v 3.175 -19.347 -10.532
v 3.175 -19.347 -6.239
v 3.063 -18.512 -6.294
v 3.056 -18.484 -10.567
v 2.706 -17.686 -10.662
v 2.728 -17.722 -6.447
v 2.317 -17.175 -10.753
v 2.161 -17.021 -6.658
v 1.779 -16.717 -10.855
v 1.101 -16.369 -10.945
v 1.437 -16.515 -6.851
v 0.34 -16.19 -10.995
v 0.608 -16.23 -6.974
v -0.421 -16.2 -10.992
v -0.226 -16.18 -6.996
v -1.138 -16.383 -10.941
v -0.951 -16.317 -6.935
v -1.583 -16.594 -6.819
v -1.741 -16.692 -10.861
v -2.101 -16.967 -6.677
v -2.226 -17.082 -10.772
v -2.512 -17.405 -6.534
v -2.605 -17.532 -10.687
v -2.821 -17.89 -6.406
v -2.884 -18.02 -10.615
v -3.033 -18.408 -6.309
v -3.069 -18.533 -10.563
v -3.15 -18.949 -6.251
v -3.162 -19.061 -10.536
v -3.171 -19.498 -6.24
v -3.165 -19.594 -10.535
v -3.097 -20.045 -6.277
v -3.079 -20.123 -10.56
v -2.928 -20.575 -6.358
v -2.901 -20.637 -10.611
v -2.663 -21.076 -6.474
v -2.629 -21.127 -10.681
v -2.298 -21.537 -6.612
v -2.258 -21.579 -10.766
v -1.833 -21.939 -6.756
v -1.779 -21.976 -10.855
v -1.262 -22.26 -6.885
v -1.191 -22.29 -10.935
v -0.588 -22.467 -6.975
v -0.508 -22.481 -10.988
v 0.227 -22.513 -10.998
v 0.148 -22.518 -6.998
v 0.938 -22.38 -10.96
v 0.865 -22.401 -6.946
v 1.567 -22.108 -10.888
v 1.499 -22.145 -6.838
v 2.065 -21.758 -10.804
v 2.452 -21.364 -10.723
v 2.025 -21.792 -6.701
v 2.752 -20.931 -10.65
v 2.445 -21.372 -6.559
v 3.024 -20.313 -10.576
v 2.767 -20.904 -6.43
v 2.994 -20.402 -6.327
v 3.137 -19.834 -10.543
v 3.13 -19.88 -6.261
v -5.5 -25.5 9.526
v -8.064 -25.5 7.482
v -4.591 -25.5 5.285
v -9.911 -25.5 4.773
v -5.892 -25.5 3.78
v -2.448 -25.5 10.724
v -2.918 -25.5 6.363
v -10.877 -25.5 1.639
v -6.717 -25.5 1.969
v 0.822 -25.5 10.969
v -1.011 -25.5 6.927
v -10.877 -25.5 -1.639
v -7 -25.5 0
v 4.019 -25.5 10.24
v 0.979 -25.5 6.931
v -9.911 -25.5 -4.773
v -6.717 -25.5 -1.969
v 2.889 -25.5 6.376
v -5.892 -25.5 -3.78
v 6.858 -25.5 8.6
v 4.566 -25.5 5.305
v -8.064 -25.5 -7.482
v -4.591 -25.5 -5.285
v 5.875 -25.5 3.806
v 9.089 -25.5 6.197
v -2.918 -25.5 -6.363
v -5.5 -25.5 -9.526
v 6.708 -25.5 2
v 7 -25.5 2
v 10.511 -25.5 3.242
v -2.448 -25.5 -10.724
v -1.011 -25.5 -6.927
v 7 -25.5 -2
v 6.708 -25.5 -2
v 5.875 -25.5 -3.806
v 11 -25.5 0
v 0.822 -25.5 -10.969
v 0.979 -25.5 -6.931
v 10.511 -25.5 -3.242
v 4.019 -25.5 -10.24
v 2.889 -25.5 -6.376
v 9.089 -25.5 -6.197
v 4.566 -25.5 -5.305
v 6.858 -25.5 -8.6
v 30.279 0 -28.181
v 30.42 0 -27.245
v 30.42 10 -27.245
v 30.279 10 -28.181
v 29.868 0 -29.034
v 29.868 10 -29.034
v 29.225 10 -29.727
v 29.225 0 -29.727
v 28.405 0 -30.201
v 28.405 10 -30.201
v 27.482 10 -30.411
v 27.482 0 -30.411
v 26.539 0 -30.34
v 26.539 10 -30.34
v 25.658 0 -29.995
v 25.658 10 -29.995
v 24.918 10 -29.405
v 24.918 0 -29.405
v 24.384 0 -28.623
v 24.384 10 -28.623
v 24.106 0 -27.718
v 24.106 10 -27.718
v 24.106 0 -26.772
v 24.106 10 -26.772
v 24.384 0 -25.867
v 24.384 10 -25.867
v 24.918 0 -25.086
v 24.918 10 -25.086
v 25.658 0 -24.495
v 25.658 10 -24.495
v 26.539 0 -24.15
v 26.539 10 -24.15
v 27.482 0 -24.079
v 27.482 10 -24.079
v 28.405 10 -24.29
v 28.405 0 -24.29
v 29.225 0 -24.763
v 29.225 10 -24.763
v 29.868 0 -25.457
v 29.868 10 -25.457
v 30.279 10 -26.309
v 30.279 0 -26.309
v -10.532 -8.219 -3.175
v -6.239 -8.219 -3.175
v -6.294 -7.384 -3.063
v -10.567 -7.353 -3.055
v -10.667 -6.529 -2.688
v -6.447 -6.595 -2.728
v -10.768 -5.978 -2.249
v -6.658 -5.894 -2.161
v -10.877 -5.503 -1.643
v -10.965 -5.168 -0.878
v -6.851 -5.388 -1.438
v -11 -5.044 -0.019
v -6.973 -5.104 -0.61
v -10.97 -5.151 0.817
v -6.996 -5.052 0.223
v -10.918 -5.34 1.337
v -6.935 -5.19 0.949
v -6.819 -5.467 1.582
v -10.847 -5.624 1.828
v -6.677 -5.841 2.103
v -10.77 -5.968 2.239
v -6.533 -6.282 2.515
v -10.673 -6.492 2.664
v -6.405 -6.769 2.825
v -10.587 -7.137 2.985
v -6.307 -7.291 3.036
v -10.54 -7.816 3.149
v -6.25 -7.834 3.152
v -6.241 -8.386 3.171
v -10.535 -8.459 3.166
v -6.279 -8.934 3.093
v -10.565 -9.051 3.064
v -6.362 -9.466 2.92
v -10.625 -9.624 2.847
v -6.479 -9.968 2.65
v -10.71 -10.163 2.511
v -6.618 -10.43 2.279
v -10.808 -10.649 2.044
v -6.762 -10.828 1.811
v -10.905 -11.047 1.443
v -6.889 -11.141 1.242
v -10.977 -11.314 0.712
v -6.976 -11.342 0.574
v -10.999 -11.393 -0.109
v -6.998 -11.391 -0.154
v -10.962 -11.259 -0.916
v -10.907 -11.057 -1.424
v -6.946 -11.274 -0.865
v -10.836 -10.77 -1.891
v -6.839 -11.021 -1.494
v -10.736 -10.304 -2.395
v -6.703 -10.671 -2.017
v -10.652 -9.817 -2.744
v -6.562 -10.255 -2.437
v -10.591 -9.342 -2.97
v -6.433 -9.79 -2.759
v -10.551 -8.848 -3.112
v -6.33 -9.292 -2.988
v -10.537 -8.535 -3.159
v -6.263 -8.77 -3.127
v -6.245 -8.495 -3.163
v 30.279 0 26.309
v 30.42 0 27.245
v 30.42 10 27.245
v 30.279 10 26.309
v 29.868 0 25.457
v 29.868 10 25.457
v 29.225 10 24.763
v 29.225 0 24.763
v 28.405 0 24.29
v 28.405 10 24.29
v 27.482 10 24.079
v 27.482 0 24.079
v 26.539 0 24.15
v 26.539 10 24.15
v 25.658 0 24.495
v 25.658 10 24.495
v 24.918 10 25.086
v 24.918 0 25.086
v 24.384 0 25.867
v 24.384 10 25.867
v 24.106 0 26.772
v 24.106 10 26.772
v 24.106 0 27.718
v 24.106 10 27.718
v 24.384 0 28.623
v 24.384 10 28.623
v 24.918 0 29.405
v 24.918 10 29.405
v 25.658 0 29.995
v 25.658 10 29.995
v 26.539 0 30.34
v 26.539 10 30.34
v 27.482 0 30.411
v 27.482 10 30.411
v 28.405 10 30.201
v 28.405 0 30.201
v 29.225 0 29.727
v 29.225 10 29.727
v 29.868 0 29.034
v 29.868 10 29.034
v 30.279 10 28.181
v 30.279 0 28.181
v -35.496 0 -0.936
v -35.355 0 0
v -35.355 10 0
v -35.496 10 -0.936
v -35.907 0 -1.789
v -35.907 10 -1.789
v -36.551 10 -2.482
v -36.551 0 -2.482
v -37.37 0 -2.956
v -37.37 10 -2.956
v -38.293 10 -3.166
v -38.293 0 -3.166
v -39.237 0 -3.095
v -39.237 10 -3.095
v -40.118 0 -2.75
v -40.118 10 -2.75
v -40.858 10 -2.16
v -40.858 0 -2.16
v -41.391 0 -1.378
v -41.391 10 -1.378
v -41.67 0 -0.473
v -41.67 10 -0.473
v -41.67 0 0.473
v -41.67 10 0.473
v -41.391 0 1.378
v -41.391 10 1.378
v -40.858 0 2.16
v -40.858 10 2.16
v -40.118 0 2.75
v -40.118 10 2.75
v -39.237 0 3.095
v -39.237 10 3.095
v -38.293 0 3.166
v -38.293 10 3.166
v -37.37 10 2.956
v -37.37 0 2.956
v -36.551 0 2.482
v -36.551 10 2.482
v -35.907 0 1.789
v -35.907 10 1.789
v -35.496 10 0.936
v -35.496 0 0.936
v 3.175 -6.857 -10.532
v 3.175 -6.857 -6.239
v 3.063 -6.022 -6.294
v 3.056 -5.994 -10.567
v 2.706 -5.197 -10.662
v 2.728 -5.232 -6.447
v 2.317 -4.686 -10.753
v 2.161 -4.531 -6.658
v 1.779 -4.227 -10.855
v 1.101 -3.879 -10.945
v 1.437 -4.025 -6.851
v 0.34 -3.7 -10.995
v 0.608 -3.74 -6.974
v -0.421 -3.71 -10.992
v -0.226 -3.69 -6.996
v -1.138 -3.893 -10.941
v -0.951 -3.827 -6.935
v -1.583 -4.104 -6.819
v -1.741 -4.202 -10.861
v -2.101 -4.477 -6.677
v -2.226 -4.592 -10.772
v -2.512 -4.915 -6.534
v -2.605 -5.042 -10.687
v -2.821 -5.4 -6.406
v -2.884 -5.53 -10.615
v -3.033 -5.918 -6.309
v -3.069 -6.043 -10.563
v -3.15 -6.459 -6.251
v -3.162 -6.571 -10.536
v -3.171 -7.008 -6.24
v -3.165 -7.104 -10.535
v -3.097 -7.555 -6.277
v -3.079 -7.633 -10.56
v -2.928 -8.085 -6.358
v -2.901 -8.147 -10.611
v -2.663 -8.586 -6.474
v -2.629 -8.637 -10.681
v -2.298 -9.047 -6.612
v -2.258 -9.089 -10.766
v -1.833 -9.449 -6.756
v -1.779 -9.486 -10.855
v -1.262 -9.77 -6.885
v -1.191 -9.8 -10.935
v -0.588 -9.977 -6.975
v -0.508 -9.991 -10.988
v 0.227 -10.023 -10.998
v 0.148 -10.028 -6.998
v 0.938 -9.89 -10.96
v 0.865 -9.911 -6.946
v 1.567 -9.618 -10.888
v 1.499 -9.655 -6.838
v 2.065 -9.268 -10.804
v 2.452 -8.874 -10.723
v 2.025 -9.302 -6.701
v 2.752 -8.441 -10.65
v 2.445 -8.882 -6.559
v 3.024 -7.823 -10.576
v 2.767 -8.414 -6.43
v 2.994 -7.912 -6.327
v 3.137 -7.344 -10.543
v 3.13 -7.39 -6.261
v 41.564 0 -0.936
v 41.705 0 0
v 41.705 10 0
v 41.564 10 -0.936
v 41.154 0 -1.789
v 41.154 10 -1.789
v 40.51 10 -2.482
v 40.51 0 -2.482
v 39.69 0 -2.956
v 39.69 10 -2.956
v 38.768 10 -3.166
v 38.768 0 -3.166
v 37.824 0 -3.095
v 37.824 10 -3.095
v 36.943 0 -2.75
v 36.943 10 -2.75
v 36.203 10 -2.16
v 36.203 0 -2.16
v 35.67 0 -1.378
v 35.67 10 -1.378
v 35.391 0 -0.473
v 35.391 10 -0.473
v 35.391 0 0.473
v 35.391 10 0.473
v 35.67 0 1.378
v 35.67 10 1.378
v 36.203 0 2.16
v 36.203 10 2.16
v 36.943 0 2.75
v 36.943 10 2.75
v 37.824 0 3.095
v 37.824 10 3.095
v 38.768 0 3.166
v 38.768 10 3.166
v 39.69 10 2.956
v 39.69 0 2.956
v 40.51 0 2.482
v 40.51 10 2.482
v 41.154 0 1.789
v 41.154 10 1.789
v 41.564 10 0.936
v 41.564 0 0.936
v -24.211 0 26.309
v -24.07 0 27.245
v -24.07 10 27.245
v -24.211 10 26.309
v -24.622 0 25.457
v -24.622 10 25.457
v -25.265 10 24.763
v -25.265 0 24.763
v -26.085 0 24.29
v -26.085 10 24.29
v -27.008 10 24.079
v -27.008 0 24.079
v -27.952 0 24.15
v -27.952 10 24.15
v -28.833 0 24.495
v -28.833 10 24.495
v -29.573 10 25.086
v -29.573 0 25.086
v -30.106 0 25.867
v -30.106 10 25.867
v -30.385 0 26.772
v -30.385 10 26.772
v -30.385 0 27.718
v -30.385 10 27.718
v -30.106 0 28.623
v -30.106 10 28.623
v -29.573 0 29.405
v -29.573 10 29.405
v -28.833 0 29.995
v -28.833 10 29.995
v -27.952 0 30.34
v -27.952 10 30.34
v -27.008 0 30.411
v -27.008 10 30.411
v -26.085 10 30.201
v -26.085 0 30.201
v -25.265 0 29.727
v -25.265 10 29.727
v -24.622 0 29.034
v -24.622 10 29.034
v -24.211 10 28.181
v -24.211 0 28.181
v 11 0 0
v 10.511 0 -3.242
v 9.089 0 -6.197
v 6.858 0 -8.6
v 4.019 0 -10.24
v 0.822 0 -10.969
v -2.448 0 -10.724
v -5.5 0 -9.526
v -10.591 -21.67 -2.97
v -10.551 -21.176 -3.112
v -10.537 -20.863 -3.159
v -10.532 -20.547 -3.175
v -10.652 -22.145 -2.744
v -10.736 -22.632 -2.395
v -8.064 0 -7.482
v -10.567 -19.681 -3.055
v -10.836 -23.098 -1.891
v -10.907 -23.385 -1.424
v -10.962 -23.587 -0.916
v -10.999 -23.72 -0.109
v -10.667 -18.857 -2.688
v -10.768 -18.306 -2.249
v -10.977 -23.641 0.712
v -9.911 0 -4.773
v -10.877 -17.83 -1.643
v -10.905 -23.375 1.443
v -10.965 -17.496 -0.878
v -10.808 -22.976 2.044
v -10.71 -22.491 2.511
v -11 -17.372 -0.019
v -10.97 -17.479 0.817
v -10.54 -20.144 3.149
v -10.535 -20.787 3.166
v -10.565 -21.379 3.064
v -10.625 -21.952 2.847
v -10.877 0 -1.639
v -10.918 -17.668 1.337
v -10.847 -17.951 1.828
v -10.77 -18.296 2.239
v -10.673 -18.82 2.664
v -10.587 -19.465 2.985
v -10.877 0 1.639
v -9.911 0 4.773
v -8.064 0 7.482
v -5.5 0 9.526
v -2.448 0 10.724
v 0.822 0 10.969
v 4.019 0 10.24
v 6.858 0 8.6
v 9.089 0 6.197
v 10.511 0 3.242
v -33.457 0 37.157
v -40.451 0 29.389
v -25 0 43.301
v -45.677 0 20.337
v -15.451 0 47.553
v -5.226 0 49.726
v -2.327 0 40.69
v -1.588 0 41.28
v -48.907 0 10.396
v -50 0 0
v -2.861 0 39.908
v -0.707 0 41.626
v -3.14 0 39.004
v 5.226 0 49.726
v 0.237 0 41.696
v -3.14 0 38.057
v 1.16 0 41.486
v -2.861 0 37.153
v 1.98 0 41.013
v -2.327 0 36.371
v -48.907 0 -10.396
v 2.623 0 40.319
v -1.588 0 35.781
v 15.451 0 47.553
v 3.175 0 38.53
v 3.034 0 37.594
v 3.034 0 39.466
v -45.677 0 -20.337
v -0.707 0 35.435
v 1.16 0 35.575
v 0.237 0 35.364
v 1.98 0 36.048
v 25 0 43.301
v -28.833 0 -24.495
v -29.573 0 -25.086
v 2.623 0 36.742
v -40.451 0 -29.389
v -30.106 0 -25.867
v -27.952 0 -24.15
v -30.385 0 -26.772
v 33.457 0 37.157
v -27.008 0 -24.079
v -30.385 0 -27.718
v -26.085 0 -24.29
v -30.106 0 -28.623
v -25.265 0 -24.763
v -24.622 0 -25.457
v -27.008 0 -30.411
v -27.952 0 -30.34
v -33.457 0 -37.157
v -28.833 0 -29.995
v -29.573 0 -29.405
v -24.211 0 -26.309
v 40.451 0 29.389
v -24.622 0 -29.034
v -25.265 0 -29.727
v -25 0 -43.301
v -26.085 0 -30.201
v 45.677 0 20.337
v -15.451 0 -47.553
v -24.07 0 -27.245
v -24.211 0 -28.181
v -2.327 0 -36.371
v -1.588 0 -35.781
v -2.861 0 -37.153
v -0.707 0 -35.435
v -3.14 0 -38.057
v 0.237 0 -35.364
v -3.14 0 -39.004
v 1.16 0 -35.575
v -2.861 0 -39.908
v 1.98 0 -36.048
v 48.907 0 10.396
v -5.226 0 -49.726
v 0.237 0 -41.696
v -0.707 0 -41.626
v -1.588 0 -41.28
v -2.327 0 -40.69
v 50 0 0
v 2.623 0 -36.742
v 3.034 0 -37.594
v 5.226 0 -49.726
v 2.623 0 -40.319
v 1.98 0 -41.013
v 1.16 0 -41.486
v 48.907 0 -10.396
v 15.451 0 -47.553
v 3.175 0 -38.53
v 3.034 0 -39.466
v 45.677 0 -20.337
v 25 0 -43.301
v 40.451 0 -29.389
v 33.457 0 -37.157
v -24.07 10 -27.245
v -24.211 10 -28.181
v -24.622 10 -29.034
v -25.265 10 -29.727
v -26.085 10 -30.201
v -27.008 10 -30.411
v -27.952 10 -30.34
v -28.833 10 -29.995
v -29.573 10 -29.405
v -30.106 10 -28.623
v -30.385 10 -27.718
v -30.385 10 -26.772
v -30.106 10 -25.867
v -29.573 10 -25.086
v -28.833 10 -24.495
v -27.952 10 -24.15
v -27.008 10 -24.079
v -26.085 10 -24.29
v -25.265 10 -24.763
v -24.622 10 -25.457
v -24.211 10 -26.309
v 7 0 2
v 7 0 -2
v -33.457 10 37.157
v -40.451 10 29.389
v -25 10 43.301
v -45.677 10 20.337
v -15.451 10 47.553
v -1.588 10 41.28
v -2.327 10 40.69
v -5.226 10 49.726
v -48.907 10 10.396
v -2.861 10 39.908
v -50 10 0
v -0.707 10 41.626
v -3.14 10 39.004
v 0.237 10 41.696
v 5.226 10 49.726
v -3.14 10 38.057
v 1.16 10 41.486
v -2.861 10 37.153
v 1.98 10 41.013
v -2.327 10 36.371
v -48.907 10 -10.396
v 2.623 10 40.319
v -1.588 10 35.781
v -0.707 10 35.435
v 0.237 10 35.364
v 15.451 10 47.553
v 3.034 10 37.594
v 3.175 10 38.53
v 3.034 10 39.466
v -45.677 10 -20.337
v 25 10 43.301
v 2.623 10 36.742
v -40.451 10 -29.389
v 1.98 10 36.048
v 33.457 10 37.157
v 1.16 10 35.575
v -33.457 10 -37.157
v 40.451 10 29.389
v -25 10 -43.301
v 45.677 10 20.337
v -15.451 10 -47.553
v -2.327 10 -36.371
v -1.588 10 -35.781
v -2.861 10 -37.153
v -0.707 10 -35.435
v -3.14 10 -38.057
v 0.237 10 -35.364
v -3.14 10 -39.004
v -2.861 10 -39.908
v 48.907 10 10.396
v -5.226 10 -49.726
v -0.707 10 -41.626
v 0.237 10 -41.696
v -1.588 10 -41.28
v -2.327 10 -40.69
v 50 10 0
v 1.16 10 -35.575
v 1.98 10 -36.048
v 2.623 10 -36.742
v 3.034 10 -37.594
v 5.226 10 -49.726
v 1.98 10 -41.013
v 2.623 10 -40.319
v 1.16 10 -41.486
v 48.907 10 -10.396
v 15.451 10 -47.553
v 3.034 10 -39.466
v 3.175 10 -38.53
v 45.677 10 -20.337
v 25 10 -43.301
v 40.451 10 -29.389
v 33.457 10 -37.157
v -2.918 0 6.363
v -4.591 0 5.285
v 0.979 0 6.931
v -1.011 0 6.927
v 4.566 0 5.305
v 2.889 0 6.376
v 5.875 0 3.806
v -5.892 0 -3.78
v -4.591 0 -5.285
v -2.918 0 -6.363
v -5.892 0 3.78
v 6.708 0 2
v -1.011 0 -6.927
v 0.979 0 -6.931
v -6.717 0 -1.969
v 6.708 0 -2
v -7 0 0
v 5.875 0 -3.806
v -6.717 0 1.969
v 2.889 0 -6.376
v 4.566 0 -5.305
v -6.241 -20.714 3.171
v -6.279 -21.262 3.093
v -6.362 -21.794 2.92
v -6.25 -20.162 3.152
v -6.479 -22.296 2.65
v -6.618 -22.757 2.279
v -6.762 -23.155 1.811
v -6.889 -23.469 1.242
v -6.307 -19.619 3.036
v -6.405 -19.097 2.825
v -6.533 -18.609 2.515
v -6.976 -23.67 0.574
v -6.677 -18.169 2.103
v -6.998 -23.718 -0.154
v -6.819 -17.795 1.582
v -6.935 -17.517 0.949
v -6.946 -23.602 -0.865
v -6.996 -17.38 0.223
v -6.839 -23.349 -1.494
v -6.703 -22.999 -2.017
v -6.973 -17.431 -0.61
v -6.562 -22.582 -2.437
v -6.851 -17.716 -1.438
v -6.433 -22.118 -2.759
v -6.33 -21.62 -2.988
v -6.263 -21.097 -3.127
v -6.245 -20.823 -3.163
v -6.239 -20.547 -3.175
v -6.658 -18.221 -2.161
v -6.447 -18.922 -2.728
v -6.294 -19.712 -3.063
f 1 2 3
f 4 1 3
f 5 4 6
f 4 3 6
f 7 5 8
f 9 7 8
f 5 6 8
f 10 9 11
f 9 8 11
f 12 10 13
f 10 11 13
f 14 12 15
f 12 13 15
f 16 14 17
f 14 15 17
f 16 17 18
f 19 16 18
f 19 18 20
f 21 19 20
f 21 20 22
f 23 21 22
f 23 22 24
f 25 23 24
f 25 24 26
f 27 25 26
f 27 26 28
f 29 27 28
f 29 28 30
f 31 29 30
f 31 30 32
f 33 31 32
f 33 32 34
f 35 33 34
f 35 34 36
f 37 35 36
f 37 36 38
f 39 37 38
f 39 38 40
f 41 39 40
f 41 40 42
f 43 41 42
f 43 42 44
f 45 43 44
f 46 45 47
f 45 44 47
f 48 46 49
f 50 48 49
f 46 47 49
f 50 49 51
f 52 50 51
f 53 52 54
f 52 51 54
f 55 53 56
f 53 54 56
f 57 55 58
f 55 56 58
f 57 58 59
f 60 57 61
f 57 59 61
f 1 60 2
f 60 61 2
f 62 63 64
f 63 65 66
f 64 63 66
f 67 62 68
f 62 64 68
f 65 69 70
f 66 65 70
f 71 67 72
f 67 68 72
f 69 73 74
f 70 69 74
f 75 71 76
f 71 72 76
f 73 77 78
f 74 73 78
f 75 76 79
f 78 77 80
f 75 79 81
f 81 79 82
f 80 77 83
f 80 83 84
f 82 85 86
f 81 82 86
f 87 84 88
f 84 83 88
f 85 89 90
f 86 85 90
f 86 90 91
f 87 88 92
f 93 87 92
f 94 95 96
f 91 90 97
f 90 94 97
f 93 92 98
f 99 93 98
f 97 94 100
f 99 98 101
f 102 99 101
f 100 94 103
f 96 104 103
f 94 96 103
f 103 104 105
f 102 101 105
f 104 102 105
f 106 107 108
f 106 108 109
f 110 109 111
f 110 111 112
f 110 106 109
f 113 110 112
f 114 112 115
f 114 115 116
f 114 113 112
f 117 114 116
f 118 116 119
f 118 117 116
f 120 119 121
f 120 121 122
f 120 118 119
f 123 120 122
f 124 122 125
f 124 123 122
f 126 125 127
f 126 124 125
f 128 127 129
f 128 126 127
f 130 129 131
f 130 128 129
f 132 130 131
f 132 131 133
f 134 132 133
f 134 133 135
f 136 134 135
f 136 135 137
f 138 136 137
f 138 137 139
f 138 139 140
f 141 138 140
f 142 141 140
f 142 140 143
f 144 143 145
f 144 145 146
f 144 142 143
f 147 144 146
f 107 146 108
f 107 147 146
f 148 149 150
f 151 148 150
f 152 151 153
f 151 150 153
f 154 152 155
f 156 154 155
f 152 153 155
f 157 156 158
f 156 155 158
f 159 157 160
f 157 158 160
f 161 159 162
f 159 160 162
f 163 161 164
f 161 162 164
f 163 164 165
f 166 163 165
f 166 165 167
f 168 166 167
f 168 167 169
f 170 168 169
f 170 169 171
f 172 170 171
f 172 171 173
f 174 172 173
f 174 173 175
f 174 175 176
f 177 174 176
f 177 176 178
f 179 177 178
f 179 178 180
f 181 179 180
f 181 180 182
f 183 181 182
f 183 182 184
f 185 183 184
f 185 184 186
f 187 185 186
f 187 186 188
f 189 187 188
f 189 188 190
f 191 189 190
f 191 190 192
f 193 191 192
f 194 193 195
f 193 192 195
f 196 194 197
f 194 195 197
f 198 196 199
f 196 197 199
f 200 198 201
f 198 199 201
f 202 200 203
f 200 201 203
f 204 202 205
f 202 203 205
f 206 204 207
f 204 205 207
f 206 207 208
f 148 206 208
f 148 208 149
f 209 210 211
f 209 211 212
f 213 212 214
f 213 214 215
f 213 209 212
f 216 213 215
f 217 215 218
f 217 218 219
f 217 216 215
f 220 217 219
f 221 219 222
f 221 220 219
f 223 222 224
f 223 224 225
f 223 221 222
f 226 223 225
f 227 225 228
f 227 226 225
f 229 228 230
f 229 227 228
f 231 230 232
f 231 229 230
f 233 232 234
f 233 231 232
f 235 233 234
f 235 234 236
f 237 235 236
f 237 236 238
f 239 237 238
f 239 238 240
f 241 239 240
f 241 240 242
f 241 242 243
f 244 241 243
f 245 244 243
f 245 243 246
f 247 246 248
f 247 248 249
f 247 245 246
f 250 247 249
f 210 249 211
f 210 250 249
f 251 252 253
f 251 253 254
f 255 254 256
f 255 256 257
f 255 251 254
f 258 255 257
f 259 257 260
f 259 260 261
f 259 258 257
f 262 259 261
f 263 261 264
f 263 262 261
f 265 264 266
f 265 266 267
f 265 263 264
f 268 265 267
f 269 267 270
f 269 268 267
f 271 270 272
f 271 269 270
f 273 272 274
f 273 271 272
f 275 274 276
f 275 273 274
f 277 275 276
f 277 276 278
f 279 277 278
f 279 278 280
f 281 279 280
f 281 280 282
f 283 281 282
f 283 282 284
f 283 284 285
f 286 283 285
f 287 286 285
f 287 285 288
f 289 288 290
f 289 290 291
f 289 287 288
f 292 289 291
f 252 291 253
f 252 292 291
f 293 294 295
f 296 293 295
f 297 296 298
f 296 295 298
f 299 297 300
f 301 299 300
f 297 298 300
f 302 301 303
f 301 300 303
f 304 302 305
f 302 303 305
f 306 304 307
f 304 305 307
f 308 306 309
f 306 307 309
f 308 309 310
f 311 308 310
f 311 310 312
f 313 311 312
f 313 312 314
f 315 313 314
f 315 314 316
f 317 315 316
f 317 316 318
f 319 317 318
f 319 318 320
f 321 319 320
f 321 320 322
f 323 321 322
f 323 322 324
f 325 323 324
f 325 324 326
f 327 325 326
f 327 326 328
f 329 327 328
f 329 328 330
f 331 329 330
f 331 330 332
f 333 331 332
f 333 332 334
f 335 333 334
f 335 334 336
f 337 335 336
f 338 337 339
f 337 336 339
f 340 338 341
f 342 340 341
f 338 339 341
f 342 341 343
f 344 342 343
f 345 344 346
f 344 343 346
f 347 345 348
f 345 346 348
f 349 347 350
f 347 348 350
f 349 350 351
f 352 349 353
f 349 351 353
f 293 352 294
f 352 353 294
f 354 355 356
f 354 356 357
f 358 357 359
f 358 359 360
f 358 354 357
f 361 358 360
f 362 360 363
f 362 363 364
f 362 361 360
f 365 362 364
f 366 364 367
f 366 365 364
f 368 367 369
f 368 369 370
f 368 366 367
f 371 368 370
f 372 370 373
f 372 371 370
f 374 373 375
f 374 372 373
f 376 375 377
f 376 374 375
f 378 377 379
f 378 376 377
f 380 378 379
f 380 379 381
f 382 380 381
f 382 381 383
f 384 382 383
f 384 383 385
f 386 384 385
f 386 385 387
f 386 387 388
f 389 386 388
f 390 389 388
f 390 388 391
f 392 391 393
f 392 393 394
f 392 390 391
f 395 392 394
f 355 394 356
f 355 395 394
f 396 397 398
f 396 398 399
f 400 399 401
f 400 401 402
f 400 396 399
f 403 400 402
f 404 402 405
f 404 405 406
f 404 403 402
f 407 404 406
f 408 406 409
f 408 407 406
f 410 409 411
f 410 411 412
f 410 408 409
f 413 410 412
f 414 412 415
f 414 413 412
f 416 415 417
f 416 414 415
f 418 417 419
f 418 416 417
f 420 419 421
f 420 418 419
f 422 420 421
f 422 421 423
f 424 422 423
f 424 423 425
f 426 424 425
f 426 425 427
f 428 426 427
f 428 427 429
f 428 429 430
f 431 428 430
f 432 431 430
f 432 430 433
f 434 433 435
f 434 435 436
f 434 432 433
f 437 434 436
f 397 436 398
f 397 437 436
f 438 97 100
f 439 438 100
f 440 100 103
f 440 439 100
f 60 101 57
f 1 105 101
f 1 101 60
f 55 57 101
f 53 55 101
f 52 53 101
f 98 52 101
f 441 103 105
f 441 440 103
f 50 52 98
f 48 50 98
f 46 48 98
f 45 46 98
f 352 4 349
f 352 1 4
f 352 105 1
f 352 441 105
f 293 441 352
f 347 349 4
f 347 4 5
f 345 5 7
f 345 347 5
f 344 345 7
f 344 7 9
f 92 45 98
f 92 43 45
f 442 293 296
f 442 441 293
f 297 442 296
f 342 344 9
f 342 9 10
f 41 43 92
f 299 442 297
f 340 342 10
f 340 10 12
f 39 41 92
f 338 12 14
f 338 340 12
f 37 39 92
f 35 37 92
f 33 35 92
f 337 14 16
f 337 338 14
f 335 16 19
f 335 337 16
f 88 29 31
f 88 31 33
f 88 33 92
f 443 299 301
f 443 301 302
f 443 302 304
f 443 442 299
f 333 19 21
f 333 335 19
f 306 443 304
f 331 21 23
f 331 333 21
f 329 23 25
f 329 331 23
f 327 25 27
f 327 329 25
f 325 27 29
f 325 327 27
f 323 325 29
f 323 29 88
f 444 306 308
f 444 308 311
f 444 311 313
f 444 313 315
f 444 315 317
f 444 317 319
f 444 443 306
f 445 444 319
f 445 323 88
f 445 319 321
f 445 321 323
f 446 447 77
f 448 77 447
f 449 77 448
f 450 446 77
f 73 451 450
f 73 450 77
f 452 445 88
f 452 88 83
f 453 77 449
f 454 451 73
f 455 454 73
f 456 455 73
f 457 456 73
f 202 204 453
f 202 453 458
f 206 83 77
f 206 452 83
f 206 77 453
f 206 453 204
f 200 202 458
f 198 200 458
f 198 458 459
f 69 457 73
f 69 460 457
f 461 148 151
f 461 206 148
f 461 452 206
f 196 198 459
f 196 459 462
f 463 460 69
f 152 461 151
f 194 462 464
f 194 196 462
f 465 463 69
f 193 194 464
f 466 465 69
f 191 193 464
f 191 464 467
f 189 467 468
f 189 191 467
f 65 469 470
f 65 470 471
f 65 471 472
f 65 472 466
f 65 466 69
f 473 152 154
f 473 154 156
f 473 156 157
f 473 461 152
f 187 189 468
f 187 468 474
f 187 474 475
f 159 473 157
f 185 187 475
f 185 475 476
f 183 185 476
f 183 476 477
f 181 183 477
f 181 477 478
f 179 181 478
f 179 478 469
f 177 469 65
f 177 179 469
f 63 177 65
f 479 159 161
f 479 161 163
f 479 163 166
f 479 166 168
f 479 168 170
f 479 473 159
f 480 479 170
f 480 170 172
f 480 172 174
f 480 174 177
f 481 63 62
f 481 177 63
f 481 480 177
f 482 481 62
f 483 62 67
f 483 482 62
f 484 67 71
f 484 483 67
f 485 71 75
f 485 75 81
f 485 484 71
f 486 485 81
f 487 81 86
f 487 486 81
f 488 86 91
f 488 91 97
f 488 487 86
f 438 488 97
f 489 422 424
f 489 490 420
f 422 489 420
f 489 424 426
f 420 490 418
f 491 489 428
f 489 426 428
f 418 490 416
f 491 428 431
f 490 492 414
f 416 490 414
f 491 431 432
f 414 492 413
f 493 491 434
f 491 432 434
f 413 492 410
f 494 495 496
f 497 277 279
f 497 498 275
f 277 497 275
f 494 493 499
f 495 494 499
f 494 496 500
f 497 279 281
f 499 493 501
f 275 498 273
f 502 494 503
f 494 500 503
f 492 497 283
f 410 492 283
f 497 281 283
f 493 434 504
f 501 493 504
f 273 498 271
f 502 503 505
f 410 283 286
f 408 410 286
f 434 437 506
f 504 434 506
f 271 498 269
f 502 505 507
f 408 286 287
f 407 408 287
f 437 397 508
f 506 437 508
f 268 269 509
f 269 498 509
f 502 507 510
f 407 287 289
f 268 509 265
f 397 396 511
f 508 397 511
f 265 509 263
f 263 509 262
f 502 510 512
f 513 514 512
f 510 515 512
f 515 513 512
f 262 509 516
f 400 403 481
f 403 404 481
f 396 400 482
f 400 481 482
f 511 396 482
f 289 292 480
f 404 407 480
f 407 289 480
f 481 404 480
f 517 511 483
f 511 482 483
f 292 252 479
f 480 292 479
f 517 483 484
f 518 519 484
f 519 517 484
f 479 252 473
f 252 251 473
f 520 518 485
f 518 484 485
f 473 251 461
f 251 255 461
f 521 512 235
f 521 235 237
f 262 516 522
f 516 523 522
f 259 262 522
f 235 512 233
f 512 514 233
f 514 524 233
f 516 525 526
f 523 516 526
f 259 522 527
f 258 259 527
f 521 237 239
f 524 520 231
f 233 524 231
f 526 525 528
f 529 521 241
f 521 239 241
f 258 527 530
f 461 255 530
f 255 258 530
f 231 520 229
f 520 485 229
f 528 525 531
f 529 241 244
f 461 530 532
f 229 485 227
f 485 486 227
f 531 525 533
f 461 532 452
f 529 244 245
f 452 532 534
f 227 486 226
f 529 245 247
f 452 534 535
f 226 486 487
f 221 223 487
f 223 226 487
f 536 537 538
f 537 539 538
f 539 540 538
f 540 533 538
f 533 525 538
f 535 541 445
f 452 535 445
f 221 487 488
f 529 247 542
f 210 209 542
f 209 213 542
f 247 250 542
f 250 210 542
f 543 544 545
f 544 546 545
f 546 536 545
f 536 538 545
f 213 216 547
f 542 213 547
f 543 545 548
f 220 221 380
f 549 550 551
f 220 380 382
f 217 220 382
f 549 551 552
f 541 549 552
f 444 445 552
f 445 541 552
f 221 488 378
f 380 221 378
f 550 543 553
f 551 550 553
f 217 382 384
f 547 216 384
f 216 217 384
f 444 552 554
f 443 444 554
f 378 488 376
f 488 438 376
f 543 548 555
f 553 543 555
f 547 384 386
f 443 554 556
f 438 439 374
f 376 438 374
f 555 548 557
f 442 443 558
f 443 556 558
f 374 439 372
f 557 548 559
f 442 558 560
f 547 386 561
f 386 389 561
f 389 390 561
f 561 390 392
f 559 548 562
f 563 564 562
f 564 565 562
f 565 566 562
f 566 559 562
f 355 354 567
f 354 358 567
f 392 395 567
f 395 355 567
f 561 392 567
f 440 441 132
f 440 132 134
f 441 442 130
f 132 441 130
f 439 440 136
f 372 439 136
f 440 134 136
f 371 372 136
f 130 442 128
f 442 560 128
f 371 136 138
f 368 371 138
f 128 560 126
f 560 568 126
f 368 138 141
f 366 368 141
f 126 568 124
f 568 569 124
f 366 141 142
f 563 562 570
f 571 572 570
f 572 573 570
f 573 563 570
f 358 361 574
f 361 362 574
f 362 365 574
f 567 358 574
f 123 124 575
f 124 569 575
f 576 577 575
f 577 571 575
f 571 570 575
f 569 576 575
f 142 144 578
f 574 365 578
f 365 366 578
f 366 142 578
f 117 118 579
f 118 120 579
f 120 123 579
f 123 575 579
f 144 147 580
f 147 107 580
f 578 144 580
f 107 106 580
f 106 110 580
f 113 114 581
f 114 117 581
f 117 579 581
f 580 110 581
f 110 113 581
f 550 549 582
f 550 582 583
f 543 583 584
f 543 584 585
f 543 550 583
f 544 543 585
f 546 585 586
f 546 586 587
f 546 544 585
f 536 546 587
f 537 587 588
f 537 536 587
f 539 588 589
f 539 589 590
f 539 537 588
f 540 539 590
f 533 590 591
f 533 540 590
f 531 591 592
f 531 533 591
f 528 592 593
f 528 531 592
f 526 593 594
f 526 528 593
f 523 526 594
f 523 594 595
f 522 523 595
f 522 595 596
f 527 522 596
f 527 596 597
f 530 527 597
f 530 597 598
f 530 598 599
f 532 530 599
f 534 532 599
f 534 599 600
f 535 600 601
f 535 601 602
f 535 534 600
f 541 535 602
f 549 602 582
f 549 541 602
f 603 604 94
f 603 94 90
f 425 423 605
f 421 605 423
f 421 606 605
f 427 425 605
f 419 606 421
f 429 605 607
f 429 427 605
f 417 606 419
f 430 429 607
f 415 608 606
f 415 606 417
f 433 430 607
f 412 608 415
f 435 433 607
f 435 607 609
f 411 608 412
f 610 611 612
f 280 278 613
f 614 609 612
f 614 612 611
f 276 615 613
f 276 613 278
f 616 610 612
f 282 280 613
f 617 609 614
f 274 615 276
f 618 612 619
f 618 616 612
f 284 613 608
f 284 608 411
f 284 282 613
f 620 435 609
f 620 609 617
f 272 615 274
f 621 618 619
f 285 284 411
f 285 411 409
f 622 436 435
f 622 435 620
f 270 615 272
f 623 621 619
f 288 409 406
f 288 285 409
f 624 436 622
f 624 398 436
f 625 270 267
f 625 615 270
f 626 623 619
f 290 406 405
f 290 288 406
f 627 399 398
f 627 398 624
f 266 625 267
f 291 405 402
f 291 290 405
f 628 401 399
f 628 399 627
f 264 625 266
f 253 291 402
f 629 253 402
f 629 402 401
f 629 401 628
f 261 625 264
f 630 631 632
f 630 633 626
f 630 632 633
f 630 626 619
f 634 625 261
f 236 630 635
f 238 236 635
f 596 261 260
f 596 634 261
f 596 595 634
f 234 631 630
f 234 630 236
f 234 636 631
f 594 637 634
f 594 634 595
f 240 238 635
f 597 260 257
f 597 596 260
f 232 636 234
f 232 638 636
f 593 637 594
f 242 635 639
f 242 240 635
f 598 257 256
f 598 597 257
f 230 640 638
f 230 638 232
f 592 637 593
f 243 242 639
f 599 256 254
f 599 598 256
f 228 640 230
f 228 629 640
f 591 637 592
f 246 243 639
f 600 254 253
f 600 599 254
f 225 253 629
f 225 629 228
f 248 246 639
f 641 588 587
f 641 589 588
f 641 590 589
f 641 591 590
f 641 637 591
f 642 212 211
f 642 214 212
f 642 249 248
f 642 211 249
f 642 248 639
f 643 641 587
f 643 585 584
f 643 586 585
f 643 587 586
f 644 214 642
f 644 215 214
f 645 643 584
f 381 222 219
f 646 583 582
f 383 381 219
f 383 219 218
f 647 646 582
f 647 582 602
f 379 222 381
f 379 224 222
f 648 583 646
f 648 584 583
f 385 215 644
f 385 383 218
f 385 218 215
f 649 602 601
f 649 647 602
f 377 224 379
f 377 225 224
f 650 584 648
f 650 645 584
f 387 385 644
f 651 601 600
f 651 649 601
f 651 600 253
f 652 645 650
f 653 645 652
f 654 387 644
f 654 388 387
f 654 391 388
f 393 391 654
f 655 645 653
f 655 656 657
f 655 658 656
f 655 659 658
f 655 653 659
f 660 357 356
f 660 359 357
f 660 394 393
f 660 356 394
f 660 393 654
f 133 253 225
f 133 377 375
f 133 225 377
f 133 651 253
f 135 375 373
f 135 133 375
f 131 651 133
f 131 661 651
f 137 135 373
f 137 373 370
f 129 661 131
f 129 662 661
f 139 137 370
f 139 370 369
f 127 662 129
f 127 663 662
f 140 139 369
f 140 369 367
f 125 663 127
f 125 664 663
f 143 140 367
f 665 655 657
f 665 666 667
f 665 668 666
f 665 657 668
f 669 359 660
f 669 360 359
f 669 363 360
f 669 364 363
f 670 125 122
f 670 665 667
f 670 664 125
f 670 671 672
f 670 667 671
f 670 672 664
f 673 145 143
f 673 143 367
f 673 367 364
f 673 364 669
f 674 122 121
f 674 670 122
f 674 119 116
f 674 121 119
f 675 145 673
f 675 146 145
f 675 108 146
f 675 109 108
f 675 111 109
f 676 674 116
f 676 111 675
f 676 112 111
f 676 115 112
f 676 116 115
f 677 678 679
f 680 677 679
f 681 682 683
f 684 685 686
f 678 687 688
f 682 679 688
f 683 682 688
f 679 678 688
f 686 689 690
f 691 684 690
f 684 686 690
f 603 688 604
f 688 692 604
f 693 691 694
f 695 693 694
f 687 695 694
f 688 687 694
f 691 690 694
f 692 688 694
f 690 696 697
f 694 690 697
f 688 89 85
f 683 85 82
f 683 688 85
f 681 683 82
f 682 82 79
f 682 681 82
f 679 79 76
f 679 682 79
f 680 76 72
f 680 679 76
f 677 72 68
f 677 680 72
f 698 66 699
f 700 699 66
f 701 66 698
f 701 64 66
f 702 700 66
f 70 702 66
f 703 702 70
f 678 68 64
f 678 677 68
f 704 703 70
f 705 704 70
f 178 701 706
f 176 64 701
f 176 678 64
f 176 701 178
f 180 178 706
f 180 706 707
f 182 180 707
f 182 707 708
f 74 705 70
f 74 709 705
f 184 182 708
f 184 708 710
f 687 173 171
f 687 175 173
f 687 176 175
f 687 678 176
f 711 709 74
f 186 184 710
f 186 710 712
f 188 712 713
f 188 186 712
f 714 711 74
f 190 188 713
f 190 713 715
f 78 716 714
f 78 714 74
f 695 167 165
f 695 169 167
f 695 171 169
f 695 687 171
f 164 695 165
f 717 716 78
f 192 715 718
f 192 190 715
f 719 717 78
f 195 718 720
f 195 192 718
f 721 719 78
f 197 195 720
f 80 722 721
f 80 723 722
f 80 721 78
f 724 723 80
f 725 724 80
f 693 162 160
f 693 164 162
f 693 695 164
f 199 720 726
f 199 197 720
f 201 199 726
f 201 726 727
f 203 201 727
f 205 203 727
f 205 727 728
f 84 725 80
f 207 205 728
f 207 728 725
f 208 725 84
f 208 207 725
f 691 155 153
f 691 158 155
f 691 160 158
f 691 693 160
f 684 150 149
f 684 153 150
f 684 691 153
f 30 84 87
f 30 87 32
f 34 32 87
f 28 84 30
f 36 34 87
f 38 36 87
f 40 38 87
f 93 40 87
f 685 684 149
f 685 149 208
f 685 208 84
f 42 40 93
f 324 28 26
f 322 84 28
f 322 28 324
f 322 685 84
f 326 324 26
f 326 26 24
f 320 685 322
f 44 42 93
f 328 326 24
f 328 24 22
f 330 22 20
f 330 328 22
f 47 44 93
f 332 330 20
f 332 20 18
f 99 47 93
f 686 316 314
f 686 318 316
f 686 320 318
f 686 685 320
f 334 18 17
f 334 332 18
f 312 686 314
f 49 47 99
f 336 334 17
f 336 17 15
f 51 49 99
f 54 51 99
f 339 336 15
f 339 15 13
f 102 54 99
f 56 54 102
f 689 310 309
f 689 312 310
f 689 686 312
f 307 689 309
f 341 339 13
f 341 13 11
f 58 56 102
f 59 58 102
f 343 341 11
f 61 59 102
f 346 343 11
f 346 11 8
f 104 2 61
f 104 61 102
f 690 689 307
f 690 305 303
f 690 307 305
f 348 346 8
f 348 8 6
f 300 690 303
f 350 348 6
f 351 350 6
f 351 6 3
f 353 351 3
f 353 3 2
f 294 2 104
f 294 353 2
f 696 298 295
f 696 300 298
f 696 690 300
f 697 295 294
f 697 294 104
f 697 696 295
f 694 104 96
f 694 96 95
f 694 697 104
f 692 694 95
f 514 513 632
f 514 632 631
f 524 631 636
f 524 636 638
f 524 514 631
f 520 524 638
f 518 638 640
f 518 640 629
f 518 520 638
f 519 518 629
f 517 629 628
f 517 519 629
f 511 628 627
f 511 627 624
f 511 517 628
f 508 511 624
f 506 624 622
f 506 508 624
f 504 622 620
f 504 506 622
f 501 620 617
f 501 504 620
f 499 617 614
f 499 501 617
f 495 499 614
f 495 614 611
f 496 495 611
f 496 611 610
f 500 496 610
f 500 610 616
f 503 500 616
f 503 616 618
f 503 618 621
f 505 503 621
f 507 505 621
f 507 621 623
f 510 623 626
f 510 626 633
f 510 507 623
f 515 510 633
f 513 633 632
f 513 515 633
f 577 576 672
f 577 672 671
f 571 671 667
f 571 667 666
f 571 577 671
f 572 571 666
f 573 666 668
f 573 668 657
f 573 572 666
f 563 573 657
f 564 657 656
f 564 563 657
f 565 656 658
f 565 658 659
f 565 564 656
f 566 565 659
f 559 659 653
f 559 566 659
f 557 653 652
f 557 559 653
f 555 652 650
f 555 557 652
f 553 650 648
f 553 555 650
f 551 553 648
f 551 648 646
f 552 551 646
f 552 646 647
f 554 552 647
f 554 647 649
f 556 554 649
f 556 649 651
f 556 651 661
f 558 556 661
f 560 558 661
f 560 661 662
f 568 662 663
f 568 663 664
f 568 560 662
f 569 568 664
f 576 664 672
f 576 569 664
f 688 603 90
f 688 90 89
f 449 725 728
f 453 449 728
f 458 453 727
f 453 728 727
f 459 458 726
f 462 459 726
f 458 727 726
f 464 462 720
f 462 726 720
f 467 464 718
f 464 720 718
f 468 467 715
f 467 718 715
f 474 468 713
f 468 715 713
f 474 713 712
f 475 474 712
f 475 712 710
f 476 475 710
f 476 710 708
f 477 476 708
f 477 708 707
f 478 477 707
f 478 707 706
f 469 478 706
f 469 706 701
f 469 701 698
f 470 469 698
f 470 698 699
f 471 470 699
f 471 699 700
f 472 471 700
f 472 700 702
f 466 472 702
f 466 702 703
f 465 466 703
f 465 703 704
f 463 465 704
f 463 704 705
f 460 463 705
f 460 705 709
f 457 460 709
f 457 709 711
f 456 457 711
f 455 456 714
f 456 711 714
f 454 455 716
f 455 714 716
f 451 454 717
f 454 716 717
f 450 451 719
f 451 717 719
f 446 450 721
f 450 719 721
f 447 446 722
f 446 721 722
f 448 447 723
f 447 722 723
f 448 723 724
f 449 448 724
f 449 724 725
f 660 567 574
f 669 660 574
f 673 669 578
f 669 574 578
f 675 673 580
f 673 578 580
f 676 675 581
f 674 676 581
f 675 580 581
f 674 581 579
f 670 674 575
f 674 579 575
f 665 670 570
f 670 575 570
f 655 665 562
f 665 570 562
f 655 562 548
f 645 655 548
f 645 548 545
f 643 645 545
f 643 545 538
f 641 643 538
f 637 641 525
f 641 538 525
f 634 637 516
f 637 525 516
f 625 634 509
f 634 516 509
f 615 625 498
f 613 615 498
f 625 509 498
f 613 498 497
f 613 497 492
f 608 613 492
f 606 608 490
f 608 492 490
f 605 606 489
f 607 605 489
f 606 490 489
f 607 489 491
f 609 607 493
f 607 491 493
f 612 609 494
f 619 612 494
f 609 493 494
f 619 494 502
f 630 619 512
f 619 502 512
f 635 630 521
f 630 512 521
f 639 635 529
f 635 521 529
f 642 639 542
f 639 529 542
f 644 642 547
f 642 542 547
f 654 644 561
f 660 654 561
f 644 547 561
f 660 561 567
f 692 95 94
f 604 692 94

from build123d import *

# Parameters (mm, degrees)
SKETCH_1_R          = 50
SKETCH_1_R_2        = 3.175
EXTRUDE_1_DEPTH     = 10
SKETCH_1_8_R        = 11
EXTRUDE_2_DEPTH     = 25.5
SKETCH_4_R          = 3.175
CUT_EXTRUDE_1_DEPTH = 30
SKETCH_2_R          = 3.175
CUT_EXTRUDE_2_DEPTH = 30
EXTRUDE_3_DEPTH     = 10
EXTRUDE_4_DEPTH     = 10


with BuildPart() as part:
    # Sketch 1 → Extrude 1 (new body)
    with BuildSketch(Plane(origin=(0, 0, 0), x_dir=(1, 0, 0), z_dir=(0, 1, 0))):
        Circle(SKETCH_1_R)
        with BuildLine():
            Line((7, -2), (6.708203932, -2))
            ThreePointArc((6.708203932, -2), (-7, 0), (6.708203932, 2))
            Line((6.708203932, 2), (7, 2))
            Line((7, 2), (7, -2))
        make_face(mode=Mode.SUBTRACT)
        with Locations((0, -38.530339059)):
            Circle(SKETCH_1_R_2, mode=Mode.SUBTRACT)
        with Locations((0, 38.530339059)):
            Circle(SKETCH_1_R_2, mode=Mode.SUBTRACT)
        with Locations((-38.530339059, 0)):
            Circle(SKETCH_1_R_2, mode=Mode.SUBTRACT)
        with Locations((38.530339059, 0)):
            Circle(SKETCH_1_R_2, mode=Mode.SUBTRACT)
        with Locations((-27.24506403, -27.24506403)):
            Circle(SKETCH_1_R_2, mode=Mode.SUBTRACT)
        with Locations((27.24506403, -27.24506403)):
            Circle(SKETCH_1_R_2, mode=Mode.SUBTRACT)
        with Locations((27.24506403, 27.24506403)):
            Circle(SKETCH_1_R_2, mode=Mode.SUBTRACT)
        with Locations((-27.24506403, 27.24506403)):
            Circle(SKETCH_1_R_2, mode=Mode.SUBTRACT)
    extrude(amount=EXTRUDE_1_DEPTH)

    # Sketch 1_8 → Extrude 2 (add)
    with BuildSketch(Plane(origin=(0, 0, 0), x_dir=(1, 0, 0), z_dir=(0, 1, 0))):
        Circle(SKETCH_1_8_R)
        with BuildLine():
            Line((7, -2), (6.708203932, -2))
            ThreePointArc((6.708203932, -2), (-7, 0), (6.708203932, 2))
            Line((6.708203932, 2), (7, 2))
            Line((7, 2), (7, -2))
        make_face(mode=Mode.SUBTRACT)
    extrude(amount=-EXTRUDE_2_DEPTH)

    # Sketch 4 → Cut-Extrude 1 (cut)
    with BuildSketch(Plane(origin=(0, 0, 0), x_dir=(0, 0, -1), z_dir=(1, 0, 0))):
        with Locations((0, -8.219375354)):
            Circle(SKETCH_4_R)
        with Locations((0, -20.547213865)):
            Circle(SKETCH_4_R)
    extrude(amount=-CUT_EXTRUDE_1_DEPTH, mode=Mode.SUBTRACT)

    # Sketch 2 → Cut-Extrude 2 (cut)
    with BuildSketch(Plane.XY):
        with Locations((0, -6.856583625)):
            Circle(SKETCH_2_R)
        with Locations((0, -19.346548073)):
            Circle(SKETCH_2_R)
    extrude(amount=-CUT_EXTRUDE_2_DEPTH, mode=Mode.SUBTRACT)

    # Sketch 1_9 → Extrude 3 (add)
    with BuildSketch(Plane(origin=(0, 0, 0), x_dir=(1, 0, 0), z_dir=(0, 1, 0))):
        with BuildLine():
            Line((6.708203932, -2), (0, -2))
            Line((0, -2), (0, 2))
            Line((0, 2), (6.708203932, 2))
            ThreePointArc((6.708203932, 2), (-7, 0), (6.708203932, -2))
        make_face()
    extrude(amount=EXTRUDE_3_DEPTH)

    # Sketch 1_10 → Extrude 4 (add)
    with BuildSketch(Plane(origin=(0, 0, 0), x_dir=(1, 0, 0), z_dir=(0, 1, 0))):
        with BuildLine():
            Line((0, 2), (0, 0))
            Line((0, 0), (7, 0))
            ThreePointArc((7, 0), (6.926666858, 1.010587075), (6.708203932, 2))
            Line((6.708203932, 2), (0, 2))
        make_face()
        with BuildLine():
            Line((0, 0), (0, -2))
            Line((0, -2), (6.708203932, -2))
            ThreePointArc((6.708203932, -2), (6.926666858, -1.010587075), (7, 0))
            Line((7, 0), (0, 0))
        make_face()
        with BuildLine():
            ThreePointArc((7, 0), (6.926666858, -1.010587075), (6.708203932, -2))
            Line((6.708203932, -2), (7, -2))
            Line((7, -2), (7, 0))
        make_face()
        with BuildLine():
            ThreePointArc((6.708203932, 2), (6.926666858, 1.010587075), (7, 0))
            Line((7, 0), (7, 2))
            Line((7, 2), (6.708203932, 2))
        make_face()
    extrude(amount=EXTRUDE_4_DEPTH)


solid = part.part
